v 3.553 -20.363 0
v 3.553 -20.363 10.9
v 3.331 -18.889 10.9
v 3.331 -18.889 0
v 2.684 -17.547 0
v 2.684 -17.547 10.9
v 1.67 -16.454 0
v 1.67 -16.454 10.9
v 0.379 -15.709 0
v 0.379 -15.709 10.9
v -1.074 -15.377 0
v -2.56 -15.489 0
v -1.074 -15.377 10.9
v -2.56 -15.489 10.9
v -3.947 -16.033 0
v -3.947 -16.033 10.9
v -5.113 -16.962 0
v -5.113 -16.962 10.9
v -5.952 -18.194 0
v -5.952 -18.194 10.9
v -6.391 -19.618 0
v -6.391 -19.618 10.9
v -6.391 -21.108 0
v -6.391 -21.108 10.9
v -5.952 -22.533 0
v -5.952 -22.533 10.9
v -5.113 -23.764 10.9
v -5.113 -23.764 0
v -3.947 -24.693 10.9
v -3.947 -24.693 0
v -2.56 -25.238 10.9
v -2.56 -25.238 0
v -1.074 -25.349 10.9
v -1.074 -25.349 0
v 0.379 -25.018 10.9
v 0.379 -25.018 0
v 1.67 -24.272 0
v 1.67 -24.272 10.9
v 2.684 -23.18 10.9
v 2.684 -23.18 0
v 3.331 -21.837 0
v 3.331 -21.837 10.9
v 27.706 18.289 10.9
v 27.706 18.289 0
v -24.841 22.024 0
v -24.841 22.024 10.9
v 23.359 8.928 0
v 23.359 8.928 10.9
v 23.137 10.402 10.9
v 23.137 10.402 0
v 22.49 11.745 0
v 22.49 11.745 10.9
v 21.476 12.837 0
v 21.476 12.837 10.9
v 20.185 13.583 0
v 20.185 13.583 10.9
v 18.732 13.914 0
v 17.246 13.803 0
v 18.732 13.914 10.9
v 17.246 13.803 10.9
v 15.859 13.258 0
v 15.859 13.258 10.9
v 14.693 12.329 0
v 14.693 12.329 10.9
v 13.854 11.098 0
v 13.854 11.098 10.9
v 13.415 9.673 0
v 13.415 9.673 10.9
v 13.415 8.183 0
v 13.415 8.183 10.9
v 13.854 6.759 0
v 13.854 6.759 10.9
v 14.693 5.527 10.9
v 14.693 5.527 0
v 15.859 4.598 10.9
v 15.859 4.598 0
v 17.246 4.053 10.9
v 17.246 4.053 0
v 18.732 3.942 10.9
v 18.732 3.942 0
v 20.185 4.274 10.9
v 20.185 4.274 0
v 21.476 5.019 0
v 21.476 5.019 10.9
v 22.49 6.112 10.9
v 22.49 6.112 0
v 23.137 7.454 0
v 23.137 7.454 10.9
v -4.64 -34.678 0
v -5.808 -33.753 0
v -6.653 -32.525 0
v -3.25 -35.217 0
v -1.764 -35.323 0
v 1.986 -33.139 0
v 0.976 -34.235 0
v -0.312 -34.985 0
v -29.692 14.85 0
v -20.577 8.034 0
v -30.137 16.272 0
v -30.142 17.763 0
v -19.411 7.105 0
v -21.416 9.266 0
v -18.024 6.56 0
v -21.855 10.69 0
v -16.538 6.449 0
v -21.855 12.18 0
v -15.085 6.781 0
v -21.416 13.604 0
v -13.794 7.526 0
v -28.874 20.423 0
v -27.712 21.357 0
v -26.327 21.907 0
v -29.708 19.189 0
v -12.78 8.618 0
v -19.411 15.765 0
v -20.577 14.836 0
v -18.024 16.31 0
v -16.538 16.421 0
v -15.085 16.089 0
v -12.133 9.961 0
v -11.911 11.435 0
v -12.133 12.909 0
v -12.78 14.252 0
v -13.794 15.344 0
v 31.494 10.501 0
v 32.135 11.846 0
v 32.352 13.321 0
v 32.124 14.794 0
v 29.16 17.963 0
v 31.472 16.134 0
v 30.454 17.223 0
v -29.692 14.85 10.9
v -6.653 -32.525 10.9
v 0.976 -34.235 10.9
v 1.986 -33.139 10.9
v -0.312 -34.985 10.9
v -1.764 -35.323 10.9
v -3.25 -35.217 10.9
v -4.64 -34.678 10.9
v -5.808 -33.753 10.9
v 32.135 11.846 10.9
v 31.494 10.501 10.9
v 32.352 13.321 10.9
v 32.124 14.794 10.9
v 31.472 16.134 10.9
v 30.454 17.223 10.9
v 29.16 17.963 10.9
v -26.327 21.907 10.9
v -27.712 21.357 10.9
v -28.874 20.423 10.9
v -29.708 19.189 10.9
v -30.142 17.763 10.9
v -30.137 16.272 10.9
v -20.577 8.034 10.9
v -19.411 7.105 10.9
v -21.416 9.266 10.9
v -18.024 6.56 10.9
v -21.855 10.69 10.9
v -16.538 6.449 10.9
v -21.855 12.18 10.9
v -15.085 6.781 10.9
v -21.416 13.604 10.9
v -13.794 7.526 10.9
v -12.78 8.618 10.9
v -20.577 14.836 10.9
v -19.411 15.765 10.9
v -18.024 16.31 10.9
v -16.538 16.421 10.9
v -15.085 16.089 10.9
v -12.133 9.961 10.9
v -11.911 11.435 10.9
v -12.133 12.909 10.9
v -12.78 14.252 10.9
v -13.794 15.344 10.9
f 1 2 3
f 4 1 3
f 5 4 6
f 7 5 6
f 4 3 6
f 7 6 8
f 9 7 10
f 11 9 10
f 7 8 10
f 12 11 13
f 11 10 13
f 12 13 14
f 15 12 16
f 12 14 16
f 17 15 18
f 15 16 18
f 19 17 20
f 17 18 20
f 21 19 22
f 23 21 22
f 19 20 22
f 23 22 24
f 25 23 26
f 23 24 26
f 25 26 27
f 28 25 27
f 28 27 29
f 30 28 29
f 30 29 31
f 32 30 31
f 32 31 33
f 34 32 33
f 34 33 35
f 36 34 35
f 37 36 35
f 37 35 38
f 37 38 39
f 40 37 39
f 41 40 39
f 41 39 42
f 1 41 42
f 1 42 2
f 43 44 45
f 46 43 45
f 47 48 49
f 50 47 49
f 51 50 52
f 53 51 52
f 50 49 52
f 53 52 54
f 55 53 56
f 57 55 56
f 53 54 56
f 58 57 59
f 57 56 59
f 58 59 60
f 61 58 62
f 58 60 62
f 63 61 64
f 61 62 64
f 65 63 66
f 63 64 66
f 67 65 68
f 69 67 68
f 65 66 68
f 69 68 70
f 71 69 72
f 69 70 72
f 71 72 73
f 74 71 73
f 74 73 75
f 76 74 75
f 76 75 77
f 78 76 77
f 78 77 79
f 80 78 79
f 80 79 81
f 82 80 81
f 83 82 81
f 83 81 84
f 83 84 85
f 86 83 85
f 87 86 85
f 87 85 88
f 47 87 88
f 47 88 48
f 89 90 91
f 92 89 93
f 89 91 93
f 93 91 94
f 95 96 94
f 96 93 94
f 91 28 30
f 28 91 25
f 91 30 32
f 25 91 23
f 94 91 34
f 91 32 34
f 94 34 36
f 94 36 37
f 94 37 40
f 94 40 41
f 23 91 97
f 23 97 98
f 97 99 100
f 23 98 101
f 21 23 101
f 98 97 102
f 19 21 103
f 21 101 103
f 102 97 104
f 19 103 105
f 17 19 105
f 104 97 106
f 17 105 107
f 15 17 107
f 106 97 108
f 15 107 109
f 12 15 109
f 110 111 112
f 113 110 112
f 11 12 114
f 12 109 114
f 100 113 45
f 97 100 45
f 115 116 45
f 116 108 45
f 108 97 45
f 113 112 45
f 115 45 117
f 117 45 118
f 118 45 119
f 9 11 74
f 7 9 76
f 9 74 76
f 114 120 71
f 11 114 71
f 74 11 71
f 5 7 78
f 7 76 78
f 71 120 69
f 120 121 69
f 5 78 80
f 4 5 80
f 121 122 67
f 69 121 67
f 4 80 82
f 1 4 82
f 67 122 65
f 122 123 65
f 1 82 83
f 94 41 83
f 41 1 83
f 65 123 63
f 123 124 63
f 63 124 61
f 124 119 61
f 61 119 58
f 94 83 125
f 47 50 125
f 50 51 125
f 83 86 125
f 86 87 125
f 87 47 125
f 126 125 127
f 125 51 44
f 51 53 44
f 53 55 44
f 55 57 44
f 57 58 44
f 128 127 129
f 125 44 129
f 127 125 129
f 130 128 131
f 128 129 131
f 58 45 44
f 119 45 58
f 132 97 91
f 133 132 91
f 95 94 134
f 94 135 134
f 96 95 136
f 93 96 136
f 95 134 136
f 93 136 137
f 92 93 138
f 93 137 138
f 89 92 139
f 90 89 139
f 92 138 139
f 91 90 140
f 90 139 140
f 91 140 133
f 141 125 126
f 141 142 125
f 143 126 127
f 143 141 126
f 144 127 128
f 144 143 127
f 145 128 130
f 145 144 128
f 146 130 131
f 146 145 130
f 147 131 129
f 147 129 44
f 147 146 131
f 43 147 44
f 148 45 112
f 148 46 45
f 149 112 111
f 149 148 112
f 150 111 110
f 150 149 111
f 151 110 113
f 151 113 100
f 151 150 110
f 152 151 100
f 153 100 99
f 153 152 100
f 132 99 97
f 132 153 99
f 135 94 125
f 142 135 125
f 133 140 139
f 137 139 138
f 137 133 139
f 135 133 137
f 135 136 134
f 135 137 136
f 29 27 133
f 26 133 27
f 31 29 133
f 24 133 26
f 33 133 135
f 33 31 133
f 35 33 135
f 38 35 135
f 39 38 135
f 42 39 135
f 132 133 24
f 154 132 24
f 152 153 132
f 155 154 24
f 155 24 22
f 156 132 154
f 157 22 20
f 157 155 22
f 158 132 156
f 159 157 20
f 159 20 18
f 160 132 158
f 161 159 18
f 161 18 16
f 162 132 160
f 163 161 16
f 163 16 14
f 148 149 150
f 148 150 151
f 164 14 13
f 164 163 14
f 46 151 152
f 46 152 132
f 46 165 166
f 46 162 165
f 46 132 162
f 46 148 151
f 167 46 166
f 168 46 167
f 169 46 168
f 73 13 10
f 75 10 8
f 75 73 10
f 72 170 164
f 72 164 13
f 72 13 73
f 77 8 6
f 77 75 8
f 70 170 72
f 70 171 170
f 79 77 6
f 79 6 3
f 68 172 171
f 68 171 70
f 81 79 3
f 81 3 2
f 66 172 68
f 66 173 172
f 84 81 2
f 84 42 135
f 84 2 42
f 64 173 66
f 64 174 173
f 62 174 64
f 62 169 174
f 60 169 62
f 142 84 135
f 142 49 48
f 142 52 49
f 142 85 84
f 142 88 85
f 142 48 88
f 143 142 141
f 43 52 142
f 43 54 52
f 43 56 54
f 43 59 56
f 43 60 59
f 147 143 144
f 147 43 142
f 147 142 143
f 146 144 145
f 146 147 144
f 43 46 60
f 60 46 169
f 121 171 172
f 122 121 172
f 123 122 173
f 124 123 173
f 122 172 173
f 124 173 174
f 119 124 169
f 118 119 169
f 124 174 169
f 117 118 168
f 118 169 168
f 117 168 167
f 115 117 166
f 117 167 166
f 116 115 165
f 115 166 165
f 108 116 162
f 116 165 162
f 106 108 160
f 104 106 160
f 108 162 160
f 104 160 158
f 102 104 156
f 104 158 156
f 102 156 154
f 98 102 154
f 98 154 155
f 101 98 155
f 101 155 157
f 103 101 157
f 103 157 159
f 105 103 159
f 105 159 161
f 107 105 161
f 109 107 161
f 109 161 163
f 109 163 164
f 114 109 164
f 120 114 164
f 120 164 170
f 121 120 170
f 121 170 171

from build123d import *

# Parameters (mm, degrees)
F1_DEPTH = 10.9
F2_R     = 5
F3_R     = 5
F4_DEPTH = 25


with BuildPart() as f1:
    # F0 (on Top) → F1 (new body)
    with BuildSketch(Plane.XY):
        Polygon((-2.8653, -40.312819), (36.344576, 17.674987), (-33.479275, 22.637833), align=None)
    extrude(amount=F1_DEPTH)

    # F2
    f2_edges = [f1.edges().sort_by_distance(p)[0] for p in [
        (36.344576, 17.674987, 5.45),
        (-2.8653, -40.312819, 5.45),
        (-33.479275, 22.637833, 5.45),
    ]]
    fillet(f2_edges, radius=F2_R)

    # F3 (on face) → F4 (cut)
    with BuildSketch(Plane.XY.offset(10.9)):
        with Locations((-1.447344, -20.363147)):
            Circle(F3_R)
        with Locations((18.358675, 8.928137)):
            Circle(F3_R)
        with Locations((-16.911331, 11.435011)):
            Circle(F3_R)
    extrude(amount=-F4_DEPTH, mode=Mode.SUBTRACT)


solid = f1.part
